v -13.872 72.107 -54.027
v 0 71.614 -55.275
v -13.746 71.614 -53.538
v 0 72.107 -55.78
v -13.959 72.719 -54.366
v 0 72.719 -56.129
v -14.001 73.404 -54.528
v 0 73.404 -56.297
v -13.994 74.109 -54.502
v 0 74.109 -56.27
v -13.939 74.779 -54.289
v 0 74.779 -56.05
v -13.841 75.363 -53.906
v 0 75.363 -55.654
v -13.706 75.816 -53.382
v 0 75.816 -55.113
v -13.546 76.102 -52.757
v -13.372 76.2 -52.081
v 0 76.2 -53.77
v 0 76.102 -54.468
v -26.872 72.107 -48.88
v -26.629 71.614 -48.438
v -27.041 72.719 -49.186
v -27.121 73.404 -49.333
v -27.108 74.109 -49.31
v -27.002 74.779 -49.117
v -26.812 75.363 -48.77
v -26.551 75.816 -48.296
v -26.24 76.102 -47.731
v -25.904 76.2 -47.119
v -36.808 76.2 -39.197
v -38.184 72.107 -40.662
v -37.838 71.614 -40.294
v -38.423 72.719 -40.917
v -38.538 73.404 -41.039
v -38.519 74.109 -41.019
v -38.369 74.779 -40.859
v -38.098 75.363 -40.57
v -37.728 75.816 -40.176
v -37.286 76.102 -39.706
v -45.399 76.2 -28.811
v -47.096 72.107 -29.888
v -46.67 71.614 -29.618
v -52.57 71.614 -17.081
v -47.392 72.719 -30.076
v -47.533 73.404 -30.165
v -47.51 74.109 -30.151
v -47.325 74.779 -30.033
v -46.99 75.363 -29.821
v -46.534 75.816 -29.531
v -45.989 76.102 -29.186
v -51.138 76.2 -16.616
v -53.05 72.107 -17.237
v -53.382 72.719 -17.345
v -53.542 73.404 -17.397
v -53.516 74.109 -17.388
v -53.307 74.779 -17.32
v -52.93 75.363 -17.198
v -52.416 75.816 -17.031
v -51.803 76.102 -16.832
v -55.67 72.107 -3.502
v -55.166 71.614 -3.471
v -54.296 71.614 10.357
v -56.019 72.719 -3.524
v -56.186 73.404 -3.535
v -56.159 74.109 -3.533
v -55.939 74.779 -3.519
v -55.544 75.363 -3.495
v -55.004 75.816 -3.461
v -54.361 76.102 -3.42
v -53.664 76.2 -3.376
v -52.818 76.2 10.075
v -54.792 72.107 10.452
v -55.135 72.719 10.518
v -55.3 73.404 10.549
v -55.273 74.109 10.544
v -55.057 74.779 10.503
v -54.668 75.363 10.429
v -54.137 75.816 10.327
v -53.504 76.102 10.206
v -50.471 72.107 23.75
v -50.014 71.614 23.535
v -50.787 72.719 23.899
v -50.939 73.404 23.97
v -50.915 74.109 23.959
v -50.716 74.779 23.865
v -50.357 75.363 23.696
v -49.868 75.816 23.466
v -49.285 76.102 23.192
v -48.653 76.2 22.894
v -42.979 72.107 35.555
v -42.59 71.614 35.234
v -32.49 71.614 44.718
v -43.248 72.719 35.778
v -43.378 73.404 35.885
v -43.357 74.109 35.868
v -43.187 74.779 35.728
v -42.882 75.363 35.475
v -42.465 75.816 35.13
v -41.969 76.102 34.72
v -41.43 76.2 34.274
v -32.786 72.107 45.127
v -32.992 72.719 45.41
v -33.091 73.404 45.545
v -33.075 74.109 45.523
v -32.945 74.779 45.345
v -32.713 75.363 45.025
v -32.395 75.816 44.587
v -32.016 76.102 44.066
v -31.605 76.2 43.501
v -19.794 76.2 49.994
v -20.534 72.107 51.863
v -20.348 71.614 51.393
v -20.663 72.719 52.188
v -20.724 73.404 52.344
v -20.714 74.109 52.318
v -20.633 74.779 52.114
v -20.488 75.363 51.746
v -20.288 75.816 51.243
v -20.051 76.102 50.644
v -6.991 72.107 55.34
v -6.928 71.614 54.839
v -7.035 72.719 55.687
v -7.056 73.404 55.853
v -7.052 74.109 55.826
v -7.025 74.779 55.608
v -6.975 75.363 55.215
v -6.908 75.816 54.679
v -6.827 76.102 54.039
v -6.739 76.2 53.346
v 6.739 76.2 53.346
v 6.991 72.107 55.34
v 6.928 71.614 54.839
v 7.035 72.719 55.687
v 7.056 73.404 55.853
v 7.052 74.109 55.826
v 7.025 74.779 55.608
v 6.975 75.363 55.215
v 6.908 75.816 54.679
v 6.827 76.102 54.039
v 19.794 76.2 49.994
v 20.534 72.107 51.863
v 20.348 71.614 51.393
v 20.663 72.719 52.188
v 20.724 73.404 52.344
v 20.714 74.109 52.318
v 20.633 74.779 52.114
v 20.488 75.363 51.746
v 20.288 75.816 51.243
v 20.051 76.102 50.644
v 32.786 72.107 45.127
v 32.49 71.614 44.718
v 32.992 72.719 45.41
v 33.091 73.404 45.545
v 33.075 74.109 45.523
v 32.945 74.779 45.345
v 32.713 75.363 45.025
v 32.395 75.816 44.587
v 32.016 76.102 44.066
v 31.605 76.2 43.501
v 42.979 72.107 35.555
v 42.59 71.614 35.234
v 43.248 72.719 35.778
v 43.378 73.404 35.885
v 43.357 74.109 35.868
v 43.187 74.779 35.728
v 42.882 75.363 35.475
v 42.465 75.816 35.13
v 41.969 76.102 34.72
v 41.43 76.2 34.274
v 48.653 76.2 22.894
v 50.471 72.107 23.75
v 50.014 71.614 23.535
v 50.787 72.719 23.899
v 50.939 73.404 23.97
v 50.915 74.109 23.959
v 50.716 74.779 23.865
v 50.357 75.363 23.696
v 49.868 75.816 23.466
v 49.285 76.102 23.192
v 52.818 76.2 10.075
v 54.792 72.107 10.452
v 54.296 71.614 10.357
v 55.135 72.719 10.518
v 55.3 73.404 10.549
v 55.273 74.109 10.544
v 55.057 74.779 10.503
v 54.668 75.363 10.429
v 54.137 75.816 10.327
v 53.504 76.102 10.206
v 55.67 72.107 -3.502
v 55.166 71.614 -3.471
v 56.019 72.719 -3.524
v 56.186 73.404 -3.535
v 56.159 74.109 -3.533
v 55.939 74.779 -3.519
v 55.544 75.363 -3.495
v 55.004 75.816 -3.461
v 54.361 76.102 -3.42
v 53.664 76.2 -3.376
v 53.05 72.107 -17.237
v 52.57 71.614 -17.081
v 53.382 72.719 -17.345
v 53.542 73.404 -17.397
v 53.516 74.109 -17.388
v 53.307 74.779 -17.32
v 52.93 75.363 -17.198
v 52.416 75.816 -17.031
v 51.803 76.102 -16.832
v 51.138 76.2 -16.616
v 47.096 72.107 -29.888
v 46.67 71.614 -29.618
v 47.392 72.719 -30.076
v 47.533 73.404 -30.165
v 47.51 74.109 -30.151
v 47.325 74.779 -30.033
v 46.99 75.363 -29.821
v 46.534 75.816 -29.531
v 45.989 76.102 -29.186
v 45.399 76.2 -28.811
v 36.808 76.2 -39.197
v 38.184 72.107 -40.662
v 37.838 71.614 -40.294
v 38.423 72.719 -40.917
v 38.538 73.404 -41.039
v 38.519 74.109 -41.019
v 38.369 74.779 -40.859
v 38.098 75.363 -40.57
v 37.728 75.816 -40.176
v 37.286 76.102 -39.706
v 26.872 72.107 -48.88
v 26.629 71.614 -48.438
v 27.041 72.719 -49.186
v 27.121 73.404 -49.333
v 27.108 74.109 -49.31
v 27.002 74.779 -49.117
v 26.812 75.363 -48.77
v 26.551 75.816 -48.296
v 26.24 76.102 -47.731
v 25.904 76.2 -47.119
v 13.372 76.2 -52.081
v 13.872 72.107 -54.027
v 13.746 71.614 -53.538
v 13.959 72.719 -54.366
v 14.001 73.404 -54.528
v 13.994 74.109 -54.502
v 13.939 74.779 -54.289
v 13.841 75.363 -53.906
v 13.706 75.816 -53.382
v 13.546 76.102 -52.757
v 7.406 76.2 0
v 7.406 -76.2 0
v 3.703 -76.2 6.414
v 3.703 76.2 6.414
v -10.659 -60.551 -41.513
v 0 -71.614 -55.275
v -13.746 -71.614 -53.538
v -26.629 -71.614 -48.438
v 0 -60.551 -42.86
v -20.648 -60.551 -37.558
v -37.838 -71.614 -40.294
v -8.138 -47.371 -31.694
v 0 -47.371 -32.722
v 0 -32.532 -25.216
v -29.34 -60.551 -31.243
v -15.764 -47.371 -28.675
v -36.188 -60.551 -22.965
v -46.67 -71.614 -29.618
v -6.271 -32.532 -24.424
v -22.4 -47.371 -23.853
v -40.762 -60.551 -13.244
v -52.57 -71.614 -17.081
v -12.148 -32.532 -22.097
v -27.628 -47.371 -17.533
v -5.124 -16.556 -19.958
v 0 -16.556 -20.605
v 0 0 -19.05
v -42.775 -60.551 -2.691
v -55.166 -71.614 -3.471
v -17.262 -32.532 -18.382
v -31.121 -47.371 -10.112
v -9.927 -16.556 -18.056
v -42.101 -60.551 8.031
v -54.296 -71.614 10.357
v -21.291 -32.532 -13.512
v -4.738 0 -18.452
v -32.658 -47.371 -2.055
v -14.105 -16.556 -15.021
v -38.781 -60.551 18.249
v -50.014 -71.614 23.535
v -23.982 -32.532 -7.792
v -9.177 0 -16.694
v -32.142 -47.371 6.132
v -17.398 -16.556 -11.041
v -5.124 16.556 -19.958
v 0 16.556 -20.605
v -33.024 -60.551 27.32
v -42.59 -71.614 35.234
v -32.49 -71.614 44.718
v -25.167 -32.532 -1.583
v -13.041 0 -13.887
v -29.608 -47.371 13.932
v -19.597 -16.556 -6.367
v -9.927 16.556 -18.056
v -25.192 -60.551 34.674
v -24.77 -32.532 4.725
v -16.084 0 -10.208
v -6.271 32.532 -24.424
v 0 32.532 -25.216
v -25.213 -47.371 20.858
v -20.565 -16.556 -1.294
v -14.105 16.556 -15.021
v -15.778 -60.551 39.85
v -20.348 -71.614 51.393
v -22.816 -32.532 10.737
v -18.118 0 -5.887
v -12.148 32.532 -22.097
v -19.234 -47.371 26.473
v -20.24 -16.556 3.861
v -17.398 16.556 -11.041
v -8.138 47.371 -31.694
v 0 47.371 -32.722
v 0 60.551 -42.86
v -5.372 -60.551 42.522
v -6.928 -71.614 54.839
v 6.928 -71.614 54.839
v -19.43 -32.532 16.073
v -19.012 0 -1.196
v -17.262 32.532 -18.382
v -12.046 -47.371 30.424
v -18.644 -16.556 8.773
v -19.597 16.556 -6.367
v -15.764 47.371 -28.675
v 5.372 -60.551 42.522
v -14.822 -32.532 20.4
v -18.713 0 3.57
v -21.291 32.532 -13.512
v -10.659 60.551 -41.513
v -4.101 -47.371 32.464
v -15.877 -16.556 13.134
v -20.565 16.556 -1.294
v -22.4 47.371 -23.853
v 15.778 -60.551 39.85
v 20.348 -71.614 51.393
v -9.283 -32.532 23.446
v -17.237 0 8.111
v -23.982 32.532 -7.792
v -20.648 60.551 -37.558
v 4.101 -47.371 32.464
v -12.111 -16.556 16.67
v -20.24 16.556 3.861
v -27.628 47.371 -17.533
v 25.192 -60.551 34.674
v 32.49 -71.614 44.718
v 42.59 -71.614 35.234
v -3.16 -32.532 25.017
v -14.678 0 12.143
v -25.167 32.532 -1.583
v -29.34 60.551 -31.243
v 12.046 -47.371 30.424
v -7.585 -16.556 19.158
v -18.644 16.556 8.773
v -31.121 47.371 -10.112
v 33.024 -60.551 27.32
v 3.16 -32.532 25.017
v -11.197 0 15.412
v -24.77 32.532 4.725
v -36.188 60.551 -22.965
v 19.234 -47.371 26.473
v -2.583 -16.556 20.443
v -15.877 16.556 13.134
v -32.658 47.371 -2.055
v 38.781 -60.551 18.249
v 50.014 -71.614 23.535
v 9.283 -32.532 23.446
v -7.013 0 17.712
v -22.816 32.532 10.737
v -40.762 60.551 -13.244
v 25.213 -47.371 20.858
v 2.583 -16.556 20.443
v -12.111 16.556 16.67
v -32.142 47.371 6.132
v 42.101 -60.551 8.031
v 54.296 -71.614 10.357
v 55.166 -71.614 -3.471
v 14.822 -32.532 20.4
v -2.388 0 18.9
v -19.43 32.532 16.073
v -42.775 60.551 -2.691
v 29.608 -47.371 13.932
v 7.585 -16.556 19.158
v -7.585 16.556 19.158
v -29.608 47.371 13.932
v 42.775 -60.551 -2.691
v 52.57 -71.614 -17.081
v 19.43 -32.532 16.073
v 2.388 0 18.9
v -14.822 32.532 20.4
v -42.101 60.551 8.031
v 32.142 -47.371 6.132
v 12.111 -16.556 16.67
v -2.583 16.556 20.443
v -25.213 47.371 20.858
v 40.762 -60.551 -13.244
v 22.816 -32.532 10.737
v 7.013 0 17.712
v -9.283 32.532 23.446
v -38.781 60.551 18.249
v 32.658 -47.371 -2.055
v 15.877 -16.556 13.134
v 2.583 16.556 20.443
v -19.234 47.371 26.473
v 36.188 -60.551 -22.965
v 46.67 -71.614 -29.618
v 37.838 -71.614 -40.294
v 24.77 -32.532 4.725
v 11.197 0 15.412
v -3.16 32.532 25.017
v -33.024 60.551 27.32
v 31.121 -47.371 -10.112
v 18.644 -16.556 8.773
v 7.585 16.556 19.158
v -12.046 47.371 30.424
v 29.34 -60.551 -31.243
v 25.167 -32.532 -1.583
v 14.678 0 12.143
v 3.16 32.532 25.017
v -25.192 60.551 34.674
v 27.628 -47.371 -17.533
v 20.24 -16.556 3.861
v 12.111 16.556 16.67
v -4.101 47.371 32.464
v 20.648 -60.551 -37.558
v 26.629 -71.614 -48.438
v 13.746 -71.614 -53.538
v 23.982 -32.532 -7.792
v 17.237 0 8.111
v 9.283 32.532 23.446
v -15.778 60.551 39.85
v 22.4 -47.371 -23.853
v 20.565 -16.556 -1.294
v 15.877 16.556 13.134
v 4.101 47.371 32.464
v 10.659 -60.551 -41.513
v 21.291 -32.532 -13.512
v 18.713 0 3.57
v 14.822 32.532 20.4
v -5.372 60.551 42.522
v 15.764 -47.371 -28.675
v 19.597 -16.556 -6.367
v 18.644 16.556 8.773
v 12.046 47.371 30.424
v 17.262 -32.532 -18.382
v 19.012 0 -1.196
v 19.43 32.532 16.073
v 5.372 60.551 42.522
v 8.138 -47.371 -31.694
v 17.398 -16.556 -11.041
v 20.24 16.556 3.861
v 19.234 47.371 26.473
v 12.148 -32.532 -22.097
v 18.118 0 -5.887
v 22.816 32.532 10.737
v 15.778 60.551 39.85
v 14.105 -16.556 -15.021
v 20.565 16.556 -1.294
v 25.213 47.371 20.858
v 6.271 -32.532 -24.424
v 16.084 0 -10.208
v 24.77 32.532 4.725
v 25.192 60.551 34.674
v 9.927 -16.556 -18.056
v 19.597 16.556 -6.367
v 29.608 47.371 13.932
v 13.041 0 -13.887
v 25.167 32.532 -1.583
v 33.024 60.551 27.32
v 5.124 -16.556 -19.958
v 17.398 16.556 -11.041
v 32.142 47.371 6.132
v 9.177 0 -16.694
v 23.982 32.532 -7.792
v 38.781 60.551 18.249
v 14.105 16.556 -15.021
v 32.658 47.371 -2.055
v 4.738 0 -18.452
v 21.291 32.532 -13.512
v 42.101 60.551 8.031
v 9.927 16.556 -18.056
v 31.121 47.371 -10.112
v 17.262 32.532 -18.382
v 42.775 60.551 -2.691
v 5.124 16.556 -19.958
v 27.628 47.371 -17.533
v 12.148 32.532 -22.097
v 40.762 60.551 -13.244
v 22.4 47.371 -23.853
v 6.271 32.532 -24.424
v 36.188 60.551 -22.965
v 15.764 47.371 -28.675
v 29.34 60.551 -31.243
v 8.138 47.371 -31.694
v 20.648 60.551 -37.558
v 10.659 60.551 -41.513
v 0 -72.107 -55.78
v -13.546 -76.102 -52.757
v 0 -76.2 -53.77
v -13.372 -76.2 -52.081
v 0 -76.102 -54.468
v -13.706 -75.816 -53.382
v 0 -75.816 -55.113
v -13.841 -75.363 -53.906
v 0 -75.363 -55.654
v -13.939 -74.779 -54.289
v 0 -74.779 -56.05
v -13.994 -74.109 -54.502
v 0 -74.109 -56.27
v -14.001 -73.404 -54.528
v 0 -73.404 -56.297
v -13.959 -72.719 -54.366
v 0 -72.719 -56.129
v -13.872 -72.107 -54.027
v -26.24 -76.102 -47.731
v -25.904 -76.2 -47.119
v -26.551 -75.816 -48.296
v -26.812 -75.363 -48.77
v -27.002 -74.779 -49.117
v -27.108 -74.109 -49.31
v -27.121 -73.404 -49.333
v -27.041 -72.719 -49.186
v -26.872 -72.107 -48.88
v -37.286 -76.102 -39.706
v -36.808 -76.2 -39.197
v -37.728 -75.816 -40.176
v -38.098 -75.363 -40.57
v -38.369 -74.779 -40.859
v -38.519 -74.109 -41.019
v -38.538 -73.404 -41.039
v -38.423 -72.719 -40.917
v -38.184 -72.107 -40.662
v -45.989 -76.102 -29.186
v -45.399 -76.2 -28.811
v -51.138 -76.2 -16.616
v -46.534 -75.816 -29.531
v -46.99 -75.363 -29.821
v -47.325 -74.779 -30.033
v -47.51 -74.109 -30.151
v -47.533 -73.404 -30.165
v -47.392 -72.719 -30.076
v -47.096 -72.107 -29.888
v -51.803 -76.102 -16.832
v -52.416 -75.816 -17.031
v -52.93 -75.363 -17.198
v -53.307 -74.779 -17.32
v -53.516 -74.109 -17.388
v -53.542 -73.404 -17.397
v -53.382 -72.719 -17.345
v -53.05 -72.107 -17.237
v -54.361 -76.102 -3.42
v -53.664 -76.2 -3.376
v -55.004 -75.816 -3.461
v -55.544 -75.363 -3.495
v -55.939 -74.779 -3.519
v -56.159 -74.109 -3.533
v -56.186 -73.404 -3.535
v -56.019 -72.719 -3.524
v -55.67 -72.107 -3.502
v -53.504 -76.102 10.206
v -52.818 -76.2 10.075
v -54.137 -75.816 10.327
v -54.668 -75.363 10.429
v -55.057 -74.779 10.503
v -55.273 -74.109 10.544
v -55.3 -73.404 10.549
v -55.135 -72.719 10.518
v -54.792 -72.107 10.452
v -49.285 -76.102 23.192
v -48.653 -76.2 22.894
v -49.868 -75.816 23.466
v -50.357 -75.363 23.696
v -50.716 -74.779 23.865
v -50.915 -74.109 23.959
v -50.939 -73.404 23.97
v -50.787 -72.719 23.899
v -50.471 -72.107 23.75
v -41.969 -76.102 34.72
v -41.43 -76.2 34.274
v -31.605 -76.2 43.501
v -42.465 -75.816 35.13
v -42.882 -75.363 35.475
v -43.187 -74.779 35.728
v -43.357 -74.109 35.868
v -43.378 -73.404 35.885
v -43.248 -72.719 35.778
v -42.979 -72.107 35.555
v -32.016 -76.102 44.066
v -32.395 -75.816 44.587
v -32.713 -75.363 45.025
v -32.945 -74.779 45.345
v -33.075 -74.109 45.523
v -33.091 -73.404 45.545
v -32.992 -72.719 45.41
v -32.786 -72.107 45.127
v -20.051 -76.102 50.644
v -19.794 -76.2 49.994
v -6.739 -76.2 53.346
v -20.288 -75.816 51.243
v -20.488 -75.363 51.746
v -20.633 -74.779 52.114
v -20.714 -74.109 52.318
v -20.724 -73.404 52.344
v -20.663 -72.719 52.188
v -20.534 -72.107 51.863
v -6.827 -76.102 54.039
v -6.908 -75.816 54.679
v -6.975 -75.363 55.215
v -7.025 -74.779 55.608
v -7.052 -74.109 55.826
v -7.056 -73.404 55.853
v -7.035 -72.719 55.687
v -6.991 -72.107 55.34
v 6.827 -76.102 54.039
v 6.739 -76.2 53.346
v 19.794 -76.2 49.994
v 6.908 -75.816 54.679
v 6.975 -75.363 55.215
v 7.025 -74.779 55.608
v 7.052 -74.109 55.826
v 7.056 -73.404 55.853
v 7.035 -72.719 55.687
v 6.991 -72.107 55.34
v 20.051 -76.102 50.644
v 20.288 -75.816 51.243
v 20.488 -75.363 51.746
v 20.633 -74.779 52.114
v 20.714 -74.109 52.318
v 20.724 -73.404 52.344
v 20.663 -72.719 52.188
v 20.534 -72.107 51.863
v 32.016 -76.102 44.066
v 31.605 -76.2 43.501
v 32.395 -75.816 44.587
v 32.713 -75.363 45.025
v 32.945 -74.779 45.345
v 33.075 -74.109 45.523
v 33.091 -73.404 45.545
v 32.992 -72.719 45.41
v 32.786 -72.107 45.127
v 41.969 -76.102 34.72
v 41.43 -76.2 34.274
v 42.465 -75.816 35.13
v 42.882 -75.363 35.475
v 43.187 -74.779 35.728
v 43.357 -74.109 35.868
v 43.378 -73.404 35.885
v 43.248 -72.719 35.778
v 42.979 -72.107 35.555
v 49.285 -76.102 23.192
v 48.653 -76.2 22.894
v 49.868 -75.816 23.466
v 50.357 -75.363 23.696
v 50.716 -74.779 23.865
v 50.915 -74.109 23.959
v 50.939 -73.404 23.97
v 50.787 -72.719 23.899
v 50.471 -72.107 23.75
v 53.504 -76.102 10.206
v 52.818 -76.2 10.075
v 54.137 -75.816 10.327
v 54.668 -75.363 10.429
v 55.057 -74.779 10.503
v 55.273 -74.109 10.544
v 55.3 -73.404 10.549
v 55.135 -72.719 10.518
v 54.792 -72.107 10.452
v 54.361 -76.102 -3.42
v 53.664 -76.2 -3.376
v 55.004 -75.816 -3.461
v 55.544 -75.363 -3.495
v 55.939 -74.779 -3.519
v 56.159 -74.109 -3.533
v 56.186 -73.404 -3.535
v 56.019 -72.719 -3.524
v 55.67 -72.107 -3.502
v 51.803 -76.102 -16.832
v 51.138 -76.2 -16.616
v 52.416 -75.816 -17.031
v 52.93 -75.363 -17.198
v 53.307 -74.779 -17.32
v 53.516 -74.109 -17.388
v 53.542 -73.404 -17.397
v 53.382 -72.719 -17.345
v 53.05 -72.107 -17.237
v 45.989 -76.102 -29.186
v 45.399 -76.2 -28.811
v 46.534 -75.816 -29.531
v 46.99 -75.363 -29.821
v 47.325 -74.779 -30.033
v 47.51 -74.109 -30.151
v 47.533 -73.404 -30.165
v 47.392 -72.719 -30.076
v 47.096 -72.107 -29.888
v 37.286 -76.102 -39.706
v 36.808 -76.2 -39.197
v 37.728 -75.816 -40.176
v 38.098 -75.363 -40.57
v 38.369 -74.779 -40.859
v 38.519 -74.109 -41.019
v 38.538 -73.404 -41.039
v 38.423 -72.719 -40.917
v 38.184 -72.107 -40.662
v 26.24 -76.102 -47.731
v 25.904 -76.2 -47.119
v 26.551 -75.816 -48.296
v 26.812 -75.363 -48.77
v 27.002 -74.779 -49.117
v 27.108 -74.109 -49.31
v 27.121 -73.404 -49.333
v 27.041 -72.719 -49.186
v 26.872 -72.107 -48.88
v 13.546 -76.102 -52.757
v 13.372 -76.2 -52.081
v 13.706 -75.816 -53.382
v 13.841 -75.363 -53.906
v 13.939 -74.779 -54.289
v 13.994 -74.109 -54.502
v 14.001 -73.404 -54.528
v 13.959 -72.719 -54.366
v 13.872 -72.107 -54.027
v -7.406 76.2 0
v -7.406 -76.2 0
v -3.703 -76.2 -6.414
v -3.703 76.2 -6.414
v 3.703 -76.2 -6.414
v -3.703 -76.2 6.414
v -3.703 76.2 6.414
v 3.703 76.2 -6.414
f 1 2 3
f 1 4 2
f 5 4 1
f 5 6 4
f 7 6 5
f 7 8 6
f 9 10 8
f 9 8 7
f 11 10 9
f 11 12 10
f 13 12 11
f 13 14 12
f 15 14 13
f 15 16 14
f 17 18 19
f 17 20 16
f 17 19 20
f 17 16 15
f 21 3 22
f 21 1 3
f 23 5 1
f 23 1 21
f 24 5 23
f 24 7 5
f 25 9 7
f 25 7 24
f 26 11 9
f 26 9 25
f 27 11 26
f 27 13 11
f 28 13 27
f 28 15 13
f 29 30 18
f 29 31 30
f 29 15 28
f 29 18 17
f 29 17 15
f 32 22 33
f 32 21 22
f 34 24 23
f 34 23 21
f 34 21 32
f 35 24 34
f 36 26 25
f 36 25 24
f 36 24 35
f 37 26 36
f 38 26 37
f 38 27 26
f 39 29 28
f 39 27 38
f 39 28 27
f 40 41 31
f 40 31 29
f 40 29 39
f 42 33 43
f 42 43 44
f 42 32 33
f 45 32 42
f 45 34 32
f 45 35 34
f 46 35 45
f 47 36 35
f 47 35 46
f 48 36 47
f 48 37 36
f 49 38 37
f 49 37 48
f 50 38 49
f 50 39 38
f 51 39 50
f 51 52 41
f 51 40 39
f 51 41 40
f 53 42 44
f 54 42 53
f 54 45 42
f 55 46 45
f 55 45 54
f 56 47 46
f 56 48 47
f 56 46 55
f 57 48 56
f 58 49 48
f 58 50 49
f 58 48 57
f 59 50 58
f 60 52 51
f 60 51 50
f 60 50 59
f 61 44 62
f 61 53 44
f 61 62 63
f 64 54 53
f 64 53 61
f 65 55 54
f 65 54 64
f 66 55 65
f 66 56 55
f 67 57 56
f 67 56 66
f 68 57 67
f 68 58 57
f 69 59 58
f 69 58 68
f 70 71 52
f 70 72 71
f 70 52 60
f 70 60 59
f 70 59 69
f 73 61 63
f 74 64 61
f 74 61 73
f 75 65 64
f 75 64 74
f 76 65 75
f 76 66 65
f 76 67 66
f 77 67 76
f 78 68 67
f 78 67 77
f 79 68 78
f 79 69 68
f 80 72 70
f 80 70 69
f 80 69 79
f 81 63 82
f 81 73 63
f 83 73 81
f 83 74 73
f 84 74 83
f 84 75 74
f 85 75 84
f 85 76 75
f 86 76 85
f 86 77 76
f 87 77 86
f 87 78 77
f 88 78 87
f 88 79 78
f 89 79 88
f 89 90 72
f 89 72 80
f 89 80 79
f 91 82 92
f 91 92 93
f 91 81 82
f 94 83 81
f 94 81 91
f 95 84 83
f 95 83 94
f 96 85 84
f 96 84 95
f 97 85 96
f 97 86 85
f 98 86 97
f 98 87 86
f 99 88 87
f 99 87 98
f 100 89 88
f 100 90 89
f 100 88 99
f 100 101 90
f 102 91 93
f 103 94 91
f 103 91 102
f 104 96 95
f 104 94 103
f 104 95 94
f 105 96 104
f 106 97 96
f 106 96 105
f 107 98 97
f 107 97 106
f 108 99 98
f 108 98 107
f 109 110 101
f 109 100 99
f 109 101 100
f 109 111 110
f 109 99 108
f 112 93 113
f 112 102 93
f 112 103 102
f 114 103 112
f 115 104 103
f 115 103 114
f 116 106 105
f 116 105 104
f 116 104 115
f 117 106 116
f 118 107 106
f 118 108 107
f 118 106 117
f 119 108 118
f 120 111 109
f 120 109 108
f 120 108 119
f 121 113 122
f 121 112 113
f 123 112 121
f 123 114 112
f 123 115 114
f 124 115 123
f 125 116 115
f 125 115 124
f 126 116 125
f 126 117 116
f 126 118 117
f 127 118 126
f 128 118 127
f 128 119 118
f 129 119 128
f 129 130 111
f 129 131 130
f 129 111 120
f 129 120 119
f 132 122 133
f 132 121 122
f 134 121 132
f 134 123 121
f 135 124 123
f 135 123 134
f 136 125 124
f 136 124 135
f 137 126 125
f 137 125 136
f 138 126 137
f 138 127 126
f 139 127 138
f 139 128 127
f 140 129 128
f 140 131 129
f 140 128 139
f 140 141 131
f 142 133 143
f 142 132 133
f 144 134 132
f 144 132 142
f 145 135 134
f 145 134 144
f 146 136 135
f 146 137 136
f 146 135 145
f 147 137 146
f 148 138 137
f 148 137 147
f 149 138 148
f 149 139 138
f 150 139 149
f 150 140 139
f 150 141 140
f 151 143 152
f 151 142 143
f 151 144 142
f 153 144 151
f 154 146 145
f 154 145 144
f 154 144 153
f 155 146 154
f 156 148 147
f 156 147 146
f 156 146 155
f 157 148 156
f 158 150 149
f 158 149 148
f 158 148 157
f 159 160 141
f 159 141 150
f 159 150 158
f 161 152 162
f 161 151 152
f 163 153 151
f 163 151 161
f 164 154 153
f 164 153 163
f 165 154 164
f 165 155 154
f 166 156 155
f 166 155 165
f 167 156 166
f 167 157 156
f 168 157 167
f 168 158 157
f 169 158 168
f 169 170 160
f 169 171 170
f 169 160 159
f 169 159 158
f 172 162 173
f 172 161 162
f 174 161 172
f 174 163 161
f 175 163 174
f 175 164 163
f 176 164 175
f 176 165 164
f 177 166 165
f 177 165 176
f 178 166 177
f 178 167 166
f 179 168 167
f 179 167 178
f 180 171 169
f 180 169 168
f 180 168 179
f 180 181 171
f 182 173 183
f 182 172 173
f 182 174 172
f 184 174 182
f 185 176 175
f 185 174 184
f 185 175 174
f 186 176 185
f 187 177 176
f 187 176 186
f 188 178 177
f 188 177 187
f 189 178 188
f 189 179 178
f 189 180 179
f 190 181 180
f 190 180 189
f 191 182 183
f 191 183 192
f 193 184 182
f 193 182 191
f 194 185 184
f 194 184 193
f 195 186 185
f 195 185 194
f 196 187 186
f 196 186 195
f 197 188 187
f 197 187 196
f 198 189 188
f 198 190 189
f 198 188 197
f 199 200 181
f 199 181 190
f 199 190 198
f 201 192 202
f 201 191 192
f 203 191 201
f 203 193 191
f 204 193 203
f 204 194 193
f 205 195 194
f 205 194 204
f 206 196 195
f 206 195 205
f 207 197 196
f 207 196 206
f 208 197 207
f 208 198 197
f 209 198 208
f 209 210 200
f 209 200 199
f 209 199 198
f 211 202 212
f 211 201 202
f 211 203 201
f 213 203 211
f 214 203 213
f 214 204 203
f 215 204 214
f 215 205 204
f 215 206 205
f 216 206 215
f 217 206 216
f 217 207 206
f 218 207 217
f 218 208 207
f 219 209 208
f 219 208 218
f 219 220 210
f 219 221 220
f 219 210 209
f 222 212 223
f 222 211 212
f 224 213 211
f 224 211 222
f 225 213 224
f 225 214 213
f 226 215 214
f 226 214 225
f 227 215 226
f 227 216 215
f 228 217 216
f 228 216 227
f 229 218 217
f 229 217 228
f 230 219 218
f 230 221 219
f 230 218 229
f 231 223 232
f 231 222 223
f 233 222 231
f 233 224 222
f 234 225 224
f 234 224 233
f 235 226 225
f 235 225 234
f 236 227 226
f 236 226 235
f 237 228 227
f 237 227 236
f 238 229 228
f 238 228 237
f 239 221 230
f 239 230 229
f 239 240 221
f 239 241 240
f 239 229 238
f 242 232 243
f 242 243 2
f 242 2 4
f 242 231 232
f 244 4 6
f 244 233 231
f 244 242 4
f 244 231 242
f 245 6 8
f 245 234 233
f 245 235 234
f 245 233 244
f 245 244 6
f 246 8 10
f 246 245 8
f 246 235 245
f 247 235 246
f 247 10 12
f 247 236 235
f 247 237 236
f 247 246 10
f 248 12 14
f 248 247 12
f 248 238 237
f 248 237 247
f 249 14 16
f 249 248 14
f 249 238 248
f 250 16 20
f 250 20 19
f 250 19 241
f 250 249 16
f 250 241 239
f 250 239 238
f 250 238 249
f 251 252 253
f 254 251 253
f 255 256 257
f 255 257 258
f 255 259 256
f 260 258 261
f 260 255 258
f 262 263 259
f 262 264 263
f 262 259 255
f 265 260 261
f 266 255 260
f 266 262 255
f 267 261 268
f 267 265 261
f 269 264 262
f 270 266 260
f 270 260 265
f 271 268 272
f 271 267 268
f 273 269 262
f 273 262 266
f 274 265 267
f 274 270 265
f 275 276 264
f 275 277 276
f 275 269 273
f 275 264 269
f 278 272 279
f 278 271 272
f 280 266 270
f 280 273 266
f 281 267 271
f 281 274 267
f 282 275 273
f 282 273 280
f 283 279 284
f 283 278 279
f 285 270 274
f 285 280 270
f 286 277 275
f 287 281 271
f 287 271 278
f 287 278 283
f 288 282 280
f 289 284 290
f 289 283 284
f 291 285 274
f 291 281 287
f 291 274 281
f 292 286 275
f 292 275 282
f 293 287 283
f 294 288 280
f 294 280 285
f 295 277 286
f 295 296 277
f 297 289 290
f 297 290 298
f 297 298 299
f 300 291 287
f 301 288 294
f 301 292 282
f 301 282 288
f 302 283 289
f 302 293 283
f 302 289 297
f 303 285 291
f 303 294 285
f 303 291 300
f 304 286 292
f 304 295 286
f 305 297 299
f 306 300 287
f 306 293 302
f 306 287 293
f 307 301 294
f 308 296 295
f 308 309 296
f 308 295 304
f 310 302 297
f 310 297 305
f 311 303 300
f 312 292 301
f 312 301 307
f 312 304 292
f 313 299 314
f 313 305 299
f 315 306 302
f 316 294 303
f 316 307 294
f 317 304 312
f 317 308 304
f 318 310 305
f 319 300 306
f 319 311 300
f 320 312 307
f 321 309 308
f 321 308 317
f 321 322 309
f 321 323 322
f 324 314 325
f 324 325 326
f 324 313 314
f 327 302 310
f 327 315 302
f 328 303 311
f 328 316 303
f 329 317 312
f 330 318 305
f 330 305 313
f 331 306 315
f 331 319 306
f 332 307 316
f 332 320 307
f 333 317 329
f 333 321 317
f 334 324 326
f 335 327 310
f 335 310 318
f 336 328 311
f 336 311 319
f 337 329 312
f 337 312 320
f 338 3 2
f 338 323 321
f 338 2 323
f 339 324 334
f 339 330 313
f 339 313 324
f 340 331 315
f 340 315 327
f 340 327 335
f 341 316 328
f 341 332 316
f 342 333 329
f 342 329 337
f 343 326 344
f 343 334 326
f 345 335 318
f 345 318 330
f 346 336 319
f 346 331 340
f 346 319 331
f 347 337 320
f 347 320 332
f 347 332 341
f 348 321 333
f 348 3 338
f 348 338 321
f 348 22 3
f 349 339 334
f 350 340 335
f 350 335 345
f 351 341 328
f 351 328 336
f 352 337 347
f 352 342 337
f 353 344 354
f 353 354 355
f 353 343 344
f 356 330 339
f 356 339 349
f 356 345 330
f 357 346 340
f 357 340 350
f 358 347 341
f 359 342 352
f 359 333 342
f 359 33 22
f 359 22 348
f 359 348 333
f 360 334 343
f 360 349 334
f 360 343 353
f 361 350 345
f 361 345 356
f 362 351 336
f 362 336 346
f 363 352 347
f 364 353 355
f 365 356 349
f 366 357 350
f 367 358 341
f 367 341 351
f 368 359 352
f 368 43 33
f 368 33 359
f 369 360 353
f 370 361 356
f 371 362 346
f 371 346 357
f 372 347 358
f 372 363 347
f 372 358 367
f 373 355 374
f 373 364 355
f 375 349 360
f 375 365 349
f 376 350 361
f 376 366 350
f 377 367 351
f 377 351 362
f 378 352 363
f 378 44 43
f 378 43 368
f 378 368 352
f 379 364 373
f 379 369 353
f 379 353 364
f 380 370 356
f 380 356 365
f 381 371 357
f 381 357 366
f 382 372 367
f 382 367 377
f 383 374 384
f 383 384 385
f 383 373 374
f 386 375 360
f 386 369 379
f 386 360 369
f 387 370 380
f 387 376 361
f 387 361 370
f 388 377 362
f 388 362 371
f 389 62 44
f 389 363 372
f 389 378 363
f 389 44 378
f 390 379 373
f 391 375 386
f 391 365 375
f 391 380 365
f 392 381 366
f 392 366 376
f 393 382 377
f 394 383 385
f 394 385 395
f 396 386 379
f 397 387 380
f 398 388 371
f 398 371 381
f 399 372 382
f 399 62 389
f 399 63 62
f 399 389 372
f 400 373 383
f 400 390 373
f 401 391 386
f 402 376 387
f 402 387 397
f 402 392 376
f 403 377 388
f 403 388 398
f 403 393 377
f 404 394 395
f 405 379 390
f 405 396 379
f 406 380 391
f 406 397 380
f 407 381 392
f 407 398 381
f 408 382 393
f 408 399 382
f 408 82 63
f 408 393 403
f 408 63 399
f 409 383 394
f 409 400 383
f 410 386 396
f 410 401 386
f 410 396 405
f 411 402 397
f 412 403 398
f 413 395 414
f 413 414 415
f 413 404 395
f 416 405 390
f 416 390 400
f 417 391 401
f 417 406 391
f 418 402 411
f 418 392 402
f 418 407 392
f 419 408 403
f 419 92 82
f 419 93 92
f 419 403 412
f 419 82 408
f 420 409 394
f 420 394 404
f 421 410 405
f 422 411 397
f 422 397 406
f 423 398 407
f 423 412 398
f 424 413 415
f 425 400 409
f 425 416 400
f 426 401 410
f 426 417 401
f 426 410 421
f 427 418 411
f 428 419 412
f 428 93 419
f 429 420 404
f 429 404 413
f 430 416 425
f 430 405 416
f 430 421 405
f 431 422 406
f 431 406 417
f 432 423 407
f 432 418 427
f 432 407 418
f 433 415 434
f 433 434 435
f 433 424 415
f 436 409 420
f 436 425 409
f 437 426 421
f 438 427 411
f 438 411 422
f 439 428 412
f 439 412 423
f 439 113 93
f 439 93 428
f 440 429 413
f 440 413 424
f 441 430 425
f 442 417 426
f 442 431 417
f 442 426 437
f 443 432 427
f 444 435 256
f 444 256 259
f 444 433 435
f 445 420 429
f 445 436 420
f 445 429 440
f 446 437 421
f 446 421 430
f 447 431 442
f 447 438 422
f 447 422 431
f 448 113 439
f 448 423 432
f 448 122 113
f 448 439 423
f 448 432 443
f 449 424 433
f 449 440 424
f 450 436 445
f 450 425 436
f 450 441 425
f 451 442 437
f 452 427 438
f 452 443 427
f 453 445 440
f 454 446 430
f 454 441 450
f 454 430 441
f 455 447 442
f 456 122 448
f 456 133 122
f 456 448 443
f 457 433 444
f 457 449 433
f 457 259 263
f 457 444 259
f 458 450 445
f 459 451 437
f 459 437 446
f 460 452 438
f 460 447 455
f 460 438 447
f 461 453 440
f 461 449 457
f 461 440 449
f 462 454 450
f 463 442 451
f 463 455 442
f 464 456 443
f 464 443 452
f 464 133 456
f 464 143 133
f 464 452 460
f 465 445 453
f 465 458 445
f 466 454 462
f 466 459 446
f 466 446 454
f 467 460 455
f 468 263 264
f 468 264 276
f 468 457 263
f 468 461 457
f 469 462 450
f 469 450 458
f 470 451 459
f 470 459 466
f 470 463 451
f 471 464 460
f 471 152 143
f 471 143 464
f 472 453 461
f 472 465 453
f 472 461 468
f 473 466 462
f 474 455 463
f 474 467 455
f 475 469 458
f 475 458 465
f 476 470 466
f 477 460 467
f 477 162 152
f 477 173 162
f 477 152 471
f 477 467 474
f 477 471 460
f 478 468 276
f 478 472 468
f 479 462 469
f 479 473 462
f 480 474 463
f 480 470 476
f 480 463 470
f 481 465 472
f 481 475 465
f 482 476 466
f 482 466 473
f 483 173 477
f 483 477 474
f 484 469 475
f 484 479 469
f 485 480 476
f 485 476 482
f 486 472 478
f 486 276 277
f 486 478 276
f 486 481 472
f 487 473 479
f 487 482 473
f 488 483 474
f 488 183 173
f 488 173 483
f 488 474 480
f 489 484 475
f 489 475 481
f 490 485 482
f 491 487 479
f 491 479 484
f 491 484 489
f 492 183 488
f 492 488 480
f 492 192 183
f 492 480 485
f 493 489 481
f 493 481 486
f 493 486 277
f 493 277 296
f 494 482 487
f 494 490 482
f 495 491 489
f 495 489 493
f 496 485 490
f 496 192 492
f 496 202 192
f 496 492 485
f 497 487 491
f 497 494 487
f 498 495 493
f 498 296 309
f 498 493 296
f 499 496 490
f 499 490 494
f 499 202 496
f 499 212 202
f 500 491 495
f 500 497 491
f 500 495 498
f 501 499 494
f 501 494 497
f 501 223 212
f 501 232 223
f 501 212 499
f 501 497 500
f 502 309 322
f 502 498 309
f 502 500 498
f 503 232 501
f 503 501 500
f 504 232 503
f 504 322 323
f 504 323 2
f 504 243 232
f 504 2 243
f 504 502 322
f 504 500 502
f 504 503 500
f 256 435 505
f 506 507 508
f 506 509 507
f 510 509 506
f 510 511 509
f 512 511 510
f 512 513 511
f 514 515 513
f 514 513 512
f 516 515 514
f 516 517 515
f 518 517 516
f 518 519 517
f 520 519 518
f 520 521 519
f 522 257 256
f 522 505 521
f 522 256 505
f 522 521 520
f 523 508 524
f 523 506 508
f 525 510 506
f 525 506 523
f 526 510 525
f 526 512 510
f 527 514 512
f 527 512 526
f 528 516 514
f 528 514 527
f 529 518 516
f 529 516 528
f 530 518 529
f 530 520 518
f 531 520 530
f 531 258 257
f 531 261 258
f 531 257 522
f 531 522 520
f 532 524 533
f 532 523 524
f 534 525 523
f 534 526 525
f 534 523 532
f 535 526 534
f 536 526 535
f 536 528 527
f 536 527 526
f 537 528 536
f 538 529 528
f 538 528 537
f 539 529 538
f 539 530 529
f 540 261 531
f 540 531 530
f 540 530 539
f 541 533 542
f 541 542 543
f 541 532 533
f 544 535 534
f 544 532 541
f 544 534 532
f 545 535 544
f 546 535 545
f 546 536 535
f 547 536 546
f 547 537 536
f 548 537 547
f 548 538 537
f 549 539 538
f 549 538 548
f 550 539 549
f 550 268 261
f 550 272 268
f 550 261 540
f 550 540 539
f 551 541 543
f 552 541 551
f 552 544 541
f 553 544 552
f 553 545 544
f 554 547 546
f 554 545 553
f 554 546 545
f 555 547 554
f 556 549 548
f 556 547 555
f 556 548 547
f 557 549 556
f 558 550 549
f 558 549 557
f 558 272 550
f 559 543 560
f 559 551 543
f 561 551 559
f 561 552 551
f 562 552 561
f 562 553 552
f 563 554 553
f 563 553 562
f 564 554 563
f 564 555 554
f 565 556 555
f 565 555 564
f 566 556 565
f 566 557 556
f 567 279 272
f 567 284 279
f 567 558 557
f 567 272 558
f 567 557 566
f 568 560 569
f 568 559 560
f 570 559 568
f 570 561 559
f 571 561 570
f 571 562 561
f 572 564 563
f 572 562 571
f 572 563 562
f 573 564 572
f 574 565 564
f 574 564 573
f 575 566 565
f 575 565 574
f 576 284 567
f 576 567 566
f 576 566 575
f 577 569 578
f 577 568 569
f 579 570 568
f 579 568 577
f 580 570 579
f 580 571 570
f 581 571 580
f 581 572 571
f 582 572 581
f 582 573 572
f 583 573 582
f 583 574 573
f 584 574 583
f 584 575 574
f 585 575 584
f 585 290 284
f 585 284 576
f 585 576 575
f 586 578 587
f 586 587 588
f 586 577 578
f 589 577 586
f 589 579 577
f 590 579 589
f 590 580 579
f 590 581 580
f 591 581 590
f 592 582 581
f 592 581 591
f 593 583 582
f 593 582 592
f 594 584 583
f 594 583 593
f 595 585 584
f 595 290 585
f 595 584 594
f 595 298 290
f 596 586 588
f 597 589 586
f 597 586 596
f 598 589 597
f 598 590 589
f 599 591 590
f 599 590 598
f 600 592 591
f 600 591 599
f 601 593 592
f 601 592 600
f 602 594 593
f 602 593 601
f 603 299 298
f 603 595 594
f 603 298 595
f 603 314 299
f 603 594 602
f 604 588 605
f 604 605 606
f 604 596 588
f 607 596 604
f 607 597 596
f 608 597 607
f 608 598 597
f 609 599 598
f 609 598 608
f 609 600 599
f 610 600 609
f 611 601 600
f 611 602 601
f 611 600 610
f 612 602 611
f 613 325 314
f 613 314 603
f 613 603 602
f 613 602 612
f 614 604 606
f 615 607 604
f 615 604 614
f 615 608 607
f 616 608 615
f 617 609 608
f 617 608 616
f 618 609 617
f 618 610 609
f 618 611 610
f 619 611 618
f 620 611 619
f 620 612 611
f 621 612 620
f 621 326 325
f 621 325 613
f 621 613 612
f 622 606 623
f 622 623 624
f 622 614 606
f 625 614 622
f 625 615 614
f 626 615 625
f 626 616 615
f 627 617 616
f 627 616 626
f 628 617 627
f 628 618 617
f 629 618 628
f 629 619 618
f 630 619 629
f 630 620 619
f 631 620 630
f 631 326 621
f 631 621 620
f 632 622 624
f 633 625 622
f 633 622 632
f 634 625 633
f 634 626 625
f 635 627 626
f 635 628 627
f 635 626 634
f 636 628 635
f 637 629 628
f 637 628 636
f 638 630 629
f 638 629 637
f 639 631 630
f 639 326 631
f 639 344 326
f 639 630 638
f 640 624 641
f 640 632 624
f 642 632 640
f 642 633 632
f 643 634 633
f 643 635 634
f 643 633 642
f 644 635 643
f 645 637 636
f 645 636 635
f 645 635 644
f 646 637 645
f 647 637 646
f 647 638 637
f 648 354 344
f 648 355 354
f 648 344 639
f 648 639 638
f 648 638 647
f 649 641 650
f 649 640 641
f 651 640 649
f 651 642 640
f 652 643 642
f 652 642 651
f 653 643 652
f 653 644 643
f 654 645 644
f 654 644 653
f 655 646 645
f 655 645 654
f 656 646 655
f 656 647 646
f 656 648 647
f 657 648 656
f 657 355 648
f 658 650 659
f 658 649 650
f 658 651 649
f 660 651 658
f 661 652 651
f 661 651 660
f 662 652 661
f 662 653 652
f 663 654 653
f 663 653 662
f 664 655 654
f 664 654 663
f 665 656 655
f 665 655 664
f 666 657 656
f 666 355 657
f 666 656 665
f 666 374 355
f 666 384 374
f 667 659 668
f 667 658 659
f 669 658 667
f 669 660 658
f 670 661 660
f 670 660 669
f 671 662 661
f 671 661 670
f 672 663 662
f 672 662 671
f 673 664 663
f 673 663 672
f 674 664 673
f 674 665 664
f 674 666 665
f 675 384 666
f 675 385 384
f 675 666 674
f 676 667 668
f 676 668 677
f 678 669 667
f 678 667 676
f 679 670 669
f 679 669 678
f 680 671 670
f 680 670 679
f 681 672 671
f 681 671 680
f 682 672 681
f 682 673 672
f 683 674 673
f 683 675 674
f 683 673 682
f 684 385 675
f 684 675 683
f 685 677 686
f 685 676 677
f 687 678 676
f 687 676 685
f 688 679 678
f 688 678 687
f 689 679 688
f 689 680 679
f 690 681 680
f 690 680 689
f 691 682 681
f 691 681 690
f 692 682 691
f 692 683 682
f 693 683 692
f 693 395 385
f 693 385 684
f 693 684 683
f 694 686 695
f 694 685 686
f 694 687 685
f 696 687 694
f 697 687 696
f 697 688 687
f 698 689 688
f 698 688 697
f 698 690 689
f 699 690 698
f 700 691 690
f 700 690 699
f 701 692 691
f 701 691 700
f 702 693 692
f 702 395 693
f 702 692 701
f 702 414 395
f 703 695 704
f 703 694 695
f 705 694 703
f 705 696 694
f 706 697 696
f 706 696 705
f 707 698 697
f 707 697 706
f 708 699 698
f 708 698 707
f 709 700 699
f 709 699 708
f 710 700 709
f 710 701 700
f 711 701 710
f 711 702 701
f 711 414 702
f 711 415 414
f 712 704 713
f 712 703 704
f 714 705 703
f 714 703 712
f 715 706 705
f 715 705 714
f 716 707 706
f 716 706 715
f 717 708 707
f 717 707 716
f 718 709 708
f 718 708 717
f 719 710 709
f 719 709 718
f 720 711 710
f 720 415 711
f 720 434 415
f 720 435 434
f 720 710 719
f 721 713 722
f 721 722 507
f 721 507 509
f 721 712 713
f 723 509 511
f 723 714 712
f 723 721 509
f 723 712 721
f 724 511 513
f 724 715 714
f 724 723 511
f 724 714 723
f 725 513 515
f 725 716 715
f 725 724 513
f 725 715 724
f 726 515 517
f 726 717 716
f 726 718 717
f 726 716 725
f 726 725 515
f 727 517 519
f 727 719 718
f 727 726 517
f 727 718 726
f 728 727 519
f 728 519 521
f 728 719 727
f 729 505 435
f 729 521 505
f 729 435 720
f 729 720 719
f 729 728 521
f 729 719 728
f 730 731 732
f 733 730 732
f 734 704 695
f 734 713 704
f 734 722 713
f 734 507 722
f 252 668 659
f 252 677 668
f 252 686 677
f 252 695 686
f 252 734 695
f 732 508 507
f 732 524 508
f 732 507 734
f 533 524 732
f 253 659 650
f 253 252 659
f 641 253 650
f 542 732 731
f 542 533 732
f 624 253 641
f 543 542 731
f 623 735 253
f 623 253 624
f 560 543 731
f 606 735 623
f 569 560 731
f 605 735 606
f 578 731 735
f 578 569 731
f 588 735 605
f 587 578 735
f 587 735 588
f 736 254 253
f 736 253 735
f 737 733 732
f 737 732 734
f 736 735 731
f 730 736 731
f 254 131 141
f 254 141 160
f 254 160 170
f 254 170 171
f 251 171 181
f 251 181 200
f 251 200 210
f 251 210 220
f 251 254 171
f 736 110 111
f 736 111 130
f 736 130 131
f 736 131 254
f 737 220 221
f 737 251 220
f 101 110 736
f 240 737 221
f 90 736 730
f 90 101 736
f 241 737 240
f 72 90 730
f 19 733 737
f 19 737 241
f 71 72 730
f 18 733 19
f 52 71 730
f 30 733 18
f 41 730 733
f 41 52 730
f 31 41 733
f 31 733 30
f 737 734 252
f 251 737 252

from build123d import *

# Parameters (mm, degrees)
CUT_EXTRUDE1_DEPTH = 172.951680952


with BuildPart() as part:
    # Sketch1 → Revolve1 (revolve)
    with BuildSketch(Plane.XY, mode=Mode.PRIVATE) as revolve1_sk:
        with BuildLine():
            Line((0, -76.2), (53.76994832, -76.2))
            ThreePointArc((53.76994832, -76.2), (56.183319637, -74.451984147), (55.274949756, -71.613888889))
            ThreePointArc((55.274949756, -71.613888889), (19.05, 0), (55.274949756, 71.613888889))
            ThreePointArc((55.274949756, 71.613888889), (56.183319637, 74.451984147), (53.76994832, 76.2))
            Line((53.76994832, 76.2), (0, 76.2))
            Line((0, 76.2), (0, -76.2))
        make_face()
    revolve(revolve1_sk.sketch.rotate(Axis((0, -76.2, 0), (0, 1, 0)), 90), axis=Axis((0, -76.2, 0), (0, 1, 0)))

    # Sketch3 → Cut-Extrude1 (cut, through all)
    with BuildSketch(Plane(origin=(0, 76.2, 0), x_dir=(1, 0, 0), z_dir=(0, 1, 0))):
        Polygon((7.405671903, 0), (3.702835951, -6.4135), (-3.702835951, -6.4135), (-7.405671903, 0), (-3.702835951, 6.4135), (3.702835951, 6.4135), align=None)
    extrude(amount=-CUT_EXTRUDE1_DEPTH, mode=Mode.SUBTRACT)


solid = part.part
